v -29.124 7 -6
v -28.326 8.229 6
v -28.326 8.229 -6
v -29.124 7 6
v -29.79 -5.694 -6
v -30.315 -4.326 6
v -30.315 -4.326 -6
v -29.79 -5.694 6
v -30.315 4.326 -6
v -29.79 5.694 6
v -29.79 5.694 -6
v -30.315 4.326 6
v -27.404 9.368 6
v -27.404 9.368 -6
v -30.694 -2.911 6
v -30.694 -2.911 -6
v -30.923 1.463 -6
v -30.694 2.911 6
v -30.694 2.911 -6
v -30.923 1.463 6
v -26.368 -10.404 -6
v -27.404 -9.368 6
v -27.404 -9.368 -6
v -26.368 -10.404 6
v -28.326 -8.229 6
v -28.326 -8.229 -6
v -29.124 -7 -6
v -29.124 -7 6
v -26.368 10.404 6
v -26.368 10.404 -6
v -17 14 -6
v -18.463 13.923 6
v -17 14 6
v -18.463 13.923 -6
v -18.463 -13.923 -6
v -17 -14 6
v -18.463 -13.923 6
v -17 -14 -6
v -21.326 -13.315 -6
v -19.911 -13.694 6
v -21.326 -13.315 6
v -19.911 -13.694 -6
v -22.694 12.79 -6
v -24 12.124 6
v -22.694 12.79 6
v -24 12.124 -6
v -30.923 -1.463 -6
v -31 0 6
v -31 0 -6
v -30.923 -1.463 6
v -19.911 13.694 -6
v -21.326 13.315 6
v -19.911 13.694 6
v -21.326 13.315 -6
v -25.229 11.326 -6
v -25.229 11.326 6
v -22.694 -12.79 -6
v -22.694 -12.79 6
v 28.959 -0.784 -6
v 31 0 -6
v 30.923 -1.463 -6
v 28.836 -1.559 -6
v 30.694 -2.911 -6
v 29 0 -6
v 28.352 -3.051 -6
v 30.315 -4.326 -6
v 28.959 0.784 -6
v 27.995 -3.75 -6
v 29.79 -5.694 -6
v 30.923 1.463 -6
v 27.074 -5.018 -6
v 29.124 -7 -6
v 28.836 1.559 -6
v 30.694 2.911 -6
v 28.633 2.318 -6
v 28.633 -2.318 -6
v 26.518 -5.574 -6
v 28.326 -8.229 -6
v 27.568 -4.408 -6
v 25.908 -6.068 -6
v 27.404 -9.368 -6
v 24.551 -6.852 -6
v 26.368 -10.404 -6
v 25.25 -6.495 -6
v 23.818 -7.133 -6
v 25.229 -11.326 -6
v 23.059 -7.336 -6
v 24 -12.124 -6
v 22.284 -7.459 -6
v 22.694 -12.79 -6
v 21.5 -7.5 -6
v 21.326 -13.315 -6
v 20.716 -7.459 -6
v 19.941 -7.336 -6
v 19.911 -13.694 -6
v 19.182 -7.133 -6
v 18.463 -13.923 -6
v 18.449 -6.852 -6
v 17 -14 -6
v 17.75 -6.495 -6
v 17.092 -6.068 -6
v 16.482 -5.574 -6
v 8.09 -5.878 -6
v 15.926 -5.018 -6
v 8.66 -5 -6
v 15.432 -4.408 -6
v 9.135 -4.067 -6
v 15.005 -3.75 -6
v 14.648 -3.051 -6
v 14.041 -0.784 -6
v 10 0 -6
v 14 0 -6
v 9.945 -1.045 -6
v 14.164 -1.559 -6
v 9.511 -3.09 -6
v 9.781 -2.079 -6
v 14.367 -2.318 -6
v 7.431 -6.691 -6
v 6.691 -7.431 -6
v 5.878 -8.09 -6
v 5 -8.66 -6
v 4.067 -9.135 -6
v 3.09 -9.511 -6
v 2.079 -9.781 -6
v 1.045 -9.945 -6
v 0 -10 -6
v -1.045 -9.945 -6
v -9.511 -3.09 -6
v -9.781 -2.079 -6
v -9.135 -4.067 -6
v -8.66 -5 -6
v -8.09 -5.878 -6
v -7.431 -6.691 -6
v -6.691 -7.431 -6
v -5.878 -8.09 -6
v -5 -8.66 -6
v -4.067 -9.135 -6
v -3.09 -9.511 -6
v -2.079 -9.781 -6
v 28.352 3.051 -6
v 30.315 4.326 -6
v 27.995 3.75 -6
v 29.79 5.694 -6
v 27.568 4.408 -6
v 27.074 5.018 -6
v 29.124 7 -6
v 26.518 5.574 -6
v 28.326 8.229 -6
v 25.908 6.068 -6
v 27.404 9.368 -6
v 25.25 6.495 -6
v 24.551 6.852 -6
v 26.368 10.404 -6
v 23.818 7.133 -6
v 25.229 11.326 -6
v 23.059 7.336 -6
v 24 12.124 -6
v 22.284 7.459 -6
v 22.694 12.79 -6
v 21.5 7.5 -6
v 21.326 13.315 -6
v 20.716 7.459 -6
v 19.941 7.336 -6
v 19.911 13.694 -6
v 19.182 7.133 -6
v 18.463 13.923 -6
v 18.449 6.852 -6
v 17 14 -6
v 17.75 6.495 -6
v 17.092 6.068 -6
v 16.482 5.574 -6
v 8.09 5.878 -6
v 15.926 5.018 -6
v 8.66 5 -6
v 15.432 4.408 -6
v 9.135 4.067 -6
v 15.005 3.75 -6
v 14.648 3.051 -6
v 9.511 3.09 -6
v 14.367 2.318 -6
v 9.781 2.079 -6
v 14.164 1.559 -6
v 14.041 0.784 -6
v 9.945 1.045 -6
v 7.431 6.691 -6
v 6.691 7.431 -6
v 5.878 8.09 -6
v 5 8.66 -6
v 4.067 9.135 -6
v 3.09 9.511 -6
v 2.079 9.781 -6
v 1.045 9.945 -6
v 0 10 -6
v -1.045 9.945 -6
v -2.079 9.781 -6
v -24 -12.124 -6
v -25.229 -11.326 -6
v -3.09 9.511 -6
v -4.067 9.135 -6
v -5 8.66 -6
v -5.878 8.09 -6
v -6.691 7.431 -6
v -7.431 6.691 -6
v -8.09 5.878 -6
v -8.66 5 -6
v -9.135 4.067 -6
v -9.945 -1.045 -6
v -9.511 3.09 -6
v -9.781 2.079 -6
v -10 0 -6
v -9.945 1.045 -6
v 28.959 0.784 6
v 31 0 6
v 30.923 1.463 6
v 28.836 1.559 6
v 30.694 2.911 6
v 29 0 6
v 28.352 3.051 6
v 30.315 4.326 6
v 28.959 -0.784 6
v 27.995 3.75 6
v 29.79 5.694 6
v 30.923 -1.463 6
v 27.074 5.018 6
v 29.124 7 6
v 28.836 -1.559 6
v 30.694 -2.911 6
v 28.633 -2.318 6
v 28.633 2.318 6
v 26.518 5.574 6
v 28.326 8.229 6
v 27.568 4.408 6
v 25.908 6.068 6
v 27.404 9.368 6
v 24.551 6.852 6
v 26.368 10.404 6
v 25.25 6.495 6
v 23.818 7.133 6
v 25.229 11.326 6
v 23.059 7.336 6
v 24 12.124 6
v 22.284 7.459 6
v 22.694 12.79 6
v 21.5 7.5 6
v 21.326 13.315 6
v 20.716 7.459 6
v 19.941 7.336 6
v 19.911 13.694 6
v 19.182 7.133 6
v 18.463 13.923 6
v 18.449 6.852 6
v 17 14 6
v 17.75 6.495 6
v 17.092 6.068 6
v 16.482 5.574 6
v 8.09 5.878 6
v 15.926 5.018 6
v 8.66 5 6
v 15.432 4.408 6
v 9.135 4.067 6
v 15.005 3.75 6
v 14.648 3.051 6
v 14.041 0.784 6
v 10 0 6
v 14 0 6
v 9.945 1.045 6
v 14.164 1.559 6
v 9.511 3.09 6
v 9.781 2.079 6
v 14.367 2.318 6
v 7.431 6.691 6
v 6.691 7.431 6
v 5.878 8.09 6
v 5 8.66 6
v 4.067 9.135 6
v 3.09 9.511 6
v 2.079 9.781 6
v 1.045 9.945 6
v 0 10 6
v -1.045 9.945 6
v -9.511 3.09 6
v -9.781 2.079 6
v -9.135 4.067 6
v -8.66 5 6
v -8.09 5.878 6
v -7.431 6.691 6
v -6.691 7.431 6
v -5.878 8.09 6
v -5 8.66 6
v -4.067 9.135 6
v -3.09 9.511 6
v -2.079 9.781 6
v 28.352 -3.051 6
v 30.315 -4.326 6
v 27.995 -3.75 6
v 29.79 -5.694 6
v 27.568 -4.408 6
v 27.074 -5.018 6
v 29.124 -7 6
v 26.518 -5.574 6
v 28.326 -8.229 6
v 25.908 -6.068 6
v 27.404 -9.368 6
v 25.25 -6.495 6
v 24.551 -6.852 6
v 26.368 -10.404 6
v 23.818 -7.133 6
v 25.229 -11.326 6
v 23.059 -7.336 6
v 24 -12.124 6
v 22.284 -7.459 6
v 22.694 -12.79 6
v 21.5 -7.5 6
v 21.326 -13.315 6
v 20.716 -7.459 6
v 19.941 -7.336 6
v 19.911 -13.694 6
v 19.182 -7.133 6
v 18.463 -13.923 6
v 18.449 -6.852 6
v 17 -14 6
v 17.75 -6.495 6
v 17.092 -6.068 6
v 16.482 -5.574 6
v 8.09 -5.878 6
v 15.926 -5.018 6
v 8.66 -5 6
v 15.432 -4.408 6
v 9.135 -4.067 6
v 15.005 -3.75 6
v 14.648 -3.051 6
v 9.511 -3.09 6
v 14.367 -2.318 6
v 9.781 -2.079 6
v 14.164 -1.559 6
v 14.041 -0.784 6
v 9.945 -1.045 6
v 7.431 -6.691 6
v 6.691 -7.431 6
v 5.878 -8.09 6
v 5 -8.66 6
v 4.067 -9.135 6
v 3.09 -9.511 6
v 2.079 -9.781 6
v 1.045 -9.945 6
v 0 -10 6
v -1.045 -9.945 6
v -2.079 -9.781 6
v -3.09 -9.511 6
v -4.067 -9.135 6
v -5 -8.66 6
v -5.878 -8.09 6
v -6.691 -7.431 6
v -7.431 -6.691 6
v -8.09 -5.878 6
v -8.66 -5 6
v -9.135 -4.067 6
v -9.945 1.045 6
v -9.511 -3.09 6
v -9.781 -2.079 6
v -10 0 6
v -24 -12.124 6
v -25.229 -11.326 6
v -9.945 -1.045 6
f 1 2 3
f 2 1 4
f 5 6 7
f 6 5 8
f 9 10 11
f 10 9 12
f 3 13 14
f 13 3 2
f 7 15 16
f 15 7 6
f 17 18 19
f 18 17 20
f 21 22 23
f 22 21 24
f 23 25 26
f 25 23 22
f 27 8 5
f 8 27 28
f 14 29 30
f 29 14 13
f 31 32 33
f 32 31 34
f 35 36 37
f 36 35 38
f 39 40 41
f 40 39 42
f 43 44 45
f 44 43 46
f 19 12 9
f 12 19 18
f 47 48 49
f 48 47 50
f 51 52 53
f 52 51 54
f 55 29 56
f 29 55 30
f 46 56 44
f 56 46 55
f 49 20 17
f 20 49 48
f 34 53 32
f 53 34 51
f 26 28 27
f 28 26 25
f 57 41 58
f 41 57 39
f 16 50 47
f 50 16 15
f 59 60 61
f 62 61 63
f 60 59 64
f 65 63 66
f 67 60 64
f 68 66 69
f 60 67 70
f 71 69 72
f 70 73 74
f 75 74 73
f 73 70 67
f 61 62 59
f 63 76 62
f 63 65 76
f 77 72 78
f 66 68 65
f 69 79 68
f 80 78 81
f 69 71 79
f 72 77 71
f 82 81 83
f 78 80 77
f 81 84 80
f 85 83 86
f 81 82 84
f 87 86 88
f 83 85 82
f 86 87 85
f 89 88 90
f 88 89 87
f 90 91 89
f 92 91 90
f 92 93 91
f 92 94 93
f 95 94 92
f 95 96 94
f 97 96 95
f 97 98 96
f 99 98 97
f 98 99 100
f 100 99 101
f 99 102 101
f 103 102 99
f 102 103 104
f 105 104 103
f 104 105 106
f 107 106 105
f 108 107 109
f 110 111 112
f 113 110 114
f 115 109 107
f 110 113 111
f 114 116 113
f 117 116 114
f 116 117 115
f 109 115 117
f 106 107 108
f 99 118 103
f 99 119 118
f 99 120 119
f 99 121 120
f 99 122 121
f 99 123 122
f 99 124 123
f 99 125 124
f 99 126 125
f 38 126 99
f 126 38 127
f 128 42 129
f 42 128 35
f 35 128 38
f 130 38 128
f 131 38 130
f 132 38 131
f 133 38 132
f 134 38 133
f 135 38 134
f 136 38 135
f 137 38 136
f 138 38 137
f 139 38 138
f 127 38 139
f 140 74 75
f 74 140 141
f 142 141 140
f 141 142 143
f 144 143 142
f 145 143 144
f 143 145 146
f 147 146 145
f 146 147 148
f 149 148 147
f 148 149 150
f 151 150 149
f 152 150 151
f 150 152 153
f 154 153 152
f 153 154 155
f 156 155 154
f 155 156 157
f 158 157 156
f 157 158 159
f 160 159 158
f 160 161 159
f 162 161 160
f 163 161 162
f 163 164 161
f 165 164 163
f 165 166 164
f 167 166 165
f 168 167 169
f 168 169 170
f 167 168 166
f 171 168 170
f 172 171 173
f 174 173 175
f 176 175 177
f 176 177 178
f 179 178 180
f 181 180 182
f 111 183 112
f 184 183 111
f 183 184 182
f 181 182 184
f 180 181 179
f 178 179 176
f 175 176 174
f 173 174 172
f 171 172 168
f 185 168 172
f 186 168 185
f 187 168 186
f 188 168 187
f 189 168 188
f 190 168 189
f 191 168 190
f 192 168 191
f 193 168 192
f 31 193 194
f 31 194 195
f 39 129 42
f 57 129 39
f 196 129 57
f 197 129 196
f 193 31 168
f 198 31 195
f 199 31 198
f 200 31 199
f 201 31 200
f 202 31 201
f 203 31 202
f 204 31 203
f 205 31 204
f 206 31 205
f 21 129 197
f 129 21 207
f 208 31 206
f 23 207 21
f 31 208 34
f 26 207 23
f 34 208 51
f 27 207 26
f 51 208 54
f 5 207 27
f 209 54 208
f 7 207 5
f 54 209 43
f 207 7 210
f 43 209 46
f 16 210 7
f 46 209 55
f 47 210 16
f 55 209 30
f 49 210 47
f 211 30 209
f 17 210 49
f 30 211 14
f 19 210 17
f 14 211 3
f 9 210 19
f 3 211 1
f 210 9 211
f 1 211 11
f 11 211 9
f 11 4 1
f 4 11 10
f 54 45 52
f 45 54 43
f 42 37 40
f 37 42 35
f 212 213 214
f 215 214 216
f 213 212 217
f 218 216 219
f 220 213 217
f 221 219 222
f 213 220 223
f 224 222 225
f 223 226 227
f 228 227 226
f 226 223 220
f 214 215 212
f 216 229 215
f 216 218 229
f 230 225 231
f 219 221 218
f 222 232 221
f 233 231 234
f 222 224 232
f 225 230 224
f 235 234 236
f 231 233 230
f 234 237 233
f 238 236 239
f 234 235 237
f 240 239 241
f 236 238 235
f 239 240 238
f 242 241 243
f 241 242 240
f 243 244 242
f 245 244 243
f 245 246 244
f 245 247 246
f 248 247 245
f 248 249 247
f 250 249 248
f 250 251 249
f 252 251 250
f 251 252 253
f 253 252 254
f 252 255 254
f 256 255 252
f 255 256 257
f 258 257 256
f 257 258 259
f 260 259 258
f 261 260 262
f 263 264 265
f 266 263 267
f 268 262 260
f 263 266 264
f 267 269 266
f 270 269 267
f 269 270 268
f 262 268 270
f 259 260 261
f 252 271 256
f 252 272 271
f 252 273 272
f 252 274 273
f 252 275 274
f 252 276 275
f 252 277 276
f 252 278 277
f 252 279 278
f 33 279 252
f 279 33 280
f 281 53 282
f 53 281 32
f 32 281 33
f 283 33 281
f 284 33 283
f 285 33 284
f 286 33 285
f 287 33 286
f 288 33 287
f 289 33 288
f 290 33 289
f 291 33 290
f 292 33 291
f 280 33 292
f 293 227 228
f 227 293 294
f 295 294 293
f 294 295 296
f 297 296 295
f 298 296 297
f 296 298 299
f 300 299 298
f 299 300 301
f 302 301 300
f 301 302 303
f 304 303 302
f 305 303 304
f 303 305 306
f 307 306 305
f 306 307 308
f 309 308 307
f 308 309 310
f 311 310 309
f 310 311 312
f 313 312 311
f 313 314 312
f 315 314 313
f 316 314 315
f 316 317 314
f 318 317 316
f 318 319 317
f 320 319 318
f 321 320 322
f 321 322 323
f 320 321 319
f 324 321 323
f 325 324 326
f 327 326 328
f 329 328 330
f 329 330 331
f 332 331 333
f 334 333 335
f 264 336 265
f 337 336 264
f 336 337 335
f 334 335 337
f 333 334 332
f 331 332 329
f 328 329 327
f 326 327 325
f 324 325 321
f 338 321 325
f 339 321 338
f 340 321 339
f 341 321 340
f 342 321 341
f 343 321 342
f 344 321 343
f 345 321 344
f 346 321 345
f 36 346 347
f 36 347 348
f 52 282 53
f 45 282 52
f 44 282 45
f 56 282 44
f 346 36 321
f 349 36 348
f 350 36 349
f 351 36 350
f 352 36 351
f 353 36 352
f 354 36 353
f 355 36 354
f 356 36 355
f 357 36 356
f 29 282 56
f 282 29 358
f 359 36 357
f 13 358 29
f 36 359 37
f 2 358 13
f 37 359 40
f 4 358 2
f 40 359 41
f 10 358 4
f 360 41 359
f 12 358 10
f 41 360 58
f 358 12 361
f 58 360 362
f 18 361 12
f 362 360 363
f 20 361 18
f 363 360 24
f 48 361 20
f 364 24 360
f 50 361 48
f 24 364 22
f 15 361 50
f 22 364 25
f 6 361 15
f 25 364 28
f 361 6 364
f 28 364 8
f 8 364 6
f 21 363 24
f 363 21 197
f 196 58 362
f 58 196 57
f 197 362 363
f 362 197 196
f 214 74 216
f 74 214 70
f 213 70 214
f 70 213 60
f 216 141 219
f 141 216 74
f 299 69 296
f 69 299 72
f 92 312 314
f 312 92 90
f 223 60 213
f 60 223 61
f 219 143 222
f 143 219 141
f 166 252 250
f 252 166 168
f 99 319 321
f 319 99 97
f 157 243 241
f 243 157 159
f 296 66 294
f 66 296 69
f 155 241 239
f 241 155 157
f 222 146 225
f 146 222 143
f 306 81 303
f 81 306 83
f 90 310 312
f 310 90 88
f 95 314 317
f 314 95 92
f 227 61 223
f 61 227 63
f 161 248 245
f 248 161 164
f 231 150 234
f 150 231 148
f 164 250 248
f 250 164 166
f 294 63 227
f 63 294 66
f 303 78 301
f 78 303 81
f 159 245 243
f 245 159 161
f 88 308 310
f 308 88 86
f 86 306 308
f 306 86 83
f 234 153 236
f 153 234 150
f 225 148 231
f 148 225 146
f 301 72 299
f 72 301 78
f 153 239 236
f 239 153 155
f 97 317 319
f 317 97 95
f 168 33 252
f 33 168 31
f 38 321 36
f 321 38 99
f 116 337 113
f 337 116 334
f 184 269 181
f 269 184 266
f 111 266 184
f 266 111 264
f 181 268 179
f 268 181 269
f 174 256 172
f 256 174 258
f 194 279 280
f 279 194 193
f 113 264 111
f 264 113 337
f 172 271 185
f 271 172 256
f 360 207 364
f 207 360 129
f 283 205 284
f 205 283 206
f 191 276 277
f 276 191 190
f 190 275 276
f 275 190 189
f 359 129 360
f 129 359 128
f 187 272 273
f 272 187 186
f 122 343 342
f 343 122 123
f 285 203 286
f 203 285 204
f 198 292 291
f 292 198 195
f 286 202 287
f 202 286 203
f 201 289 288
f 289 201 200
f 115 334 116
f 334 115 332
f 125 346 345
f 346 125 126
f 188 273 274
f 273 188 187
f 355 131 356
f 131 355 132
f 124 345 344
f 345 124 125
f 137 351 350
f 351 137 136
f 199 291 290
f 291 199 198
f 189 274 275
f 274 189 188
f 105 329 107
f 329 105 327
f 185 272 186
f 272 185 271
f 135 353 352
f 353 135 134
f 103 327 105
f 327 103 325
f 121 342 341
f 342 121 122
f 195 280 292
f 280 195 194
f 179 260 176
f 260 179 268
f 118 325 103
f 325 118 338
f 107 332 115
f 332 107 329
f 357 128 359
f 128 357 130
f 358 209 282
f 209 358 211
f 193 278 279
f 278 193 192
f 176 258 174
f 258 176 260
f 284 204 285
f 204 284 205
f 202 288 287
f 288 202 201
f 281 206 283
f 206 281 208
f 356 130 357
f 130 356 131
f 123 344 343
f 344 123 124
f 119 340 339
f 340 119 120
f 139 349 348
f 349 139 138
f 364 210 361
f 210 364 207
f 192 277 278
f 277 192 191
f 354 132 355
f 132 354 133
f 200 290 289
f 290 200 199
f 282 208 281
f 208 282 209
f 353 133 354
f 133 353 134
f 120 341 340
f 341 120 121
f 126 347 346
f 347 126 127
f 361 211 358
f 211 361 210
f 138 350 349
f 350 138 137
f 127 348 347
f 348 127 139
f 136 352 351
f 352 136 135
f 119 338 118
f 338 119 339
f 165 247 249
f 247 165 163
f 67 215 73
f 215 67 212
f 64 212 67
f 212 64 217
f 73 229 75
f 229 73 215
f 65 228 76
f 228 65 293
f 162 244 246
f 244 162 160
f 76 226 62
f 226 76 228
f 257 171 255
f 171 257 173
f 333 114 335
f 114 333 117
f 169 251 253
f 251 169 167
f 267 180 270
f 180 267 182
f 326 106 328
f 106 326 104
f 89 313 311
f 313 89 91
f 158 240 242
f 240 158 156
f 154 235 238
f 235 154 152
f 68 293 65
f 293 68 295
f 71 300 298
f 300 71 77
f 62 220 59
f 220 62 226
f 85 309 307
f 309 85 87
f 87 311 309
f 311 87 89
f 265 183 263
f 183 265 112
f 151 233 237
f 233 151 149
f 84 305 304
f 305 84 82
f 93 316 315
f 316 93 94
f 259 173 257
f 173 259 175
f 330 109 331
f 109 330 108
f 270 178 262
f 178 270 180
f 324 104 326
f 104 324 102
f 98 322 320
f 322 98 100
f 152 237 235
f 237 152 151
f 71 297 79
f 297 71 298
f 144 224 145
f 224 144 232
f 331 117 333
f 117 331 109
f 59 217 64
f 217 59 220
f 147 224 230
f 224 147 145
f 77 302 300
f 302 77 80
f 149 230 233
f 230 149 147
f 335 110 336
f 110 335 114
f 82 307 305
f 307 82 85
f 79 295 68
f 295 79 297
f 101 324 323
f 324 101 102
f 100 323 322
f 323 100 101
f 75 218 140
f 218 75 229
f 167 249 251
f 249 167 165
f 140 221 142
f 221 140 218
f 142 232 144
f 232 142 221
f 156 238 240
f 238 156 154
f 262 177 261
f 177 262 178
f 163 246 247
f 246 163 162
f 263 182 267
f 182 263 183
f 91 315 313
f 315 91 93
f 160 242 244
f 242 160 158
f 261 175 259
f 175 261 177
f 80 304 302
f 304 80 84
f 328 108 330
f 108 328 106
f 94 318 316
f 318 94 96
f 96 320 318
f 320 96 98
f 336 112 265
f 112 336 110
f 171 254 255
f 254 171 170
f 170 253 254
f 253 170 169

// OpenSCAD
dremel_accessory_diam = 20;
dremel_accesory_height = 12;

aspirator_thickness_thick = 4;
aspirator_thickness_slim = 2;

aspirator_tube_diam = 15;
aspirator_tube_holder_height = 15;

aspirator_hole_height = 15;
aspirator_hole_diam = 15;

dremel_wrench_diam = 25;

// Useful MCAD functions reference

//use <MCAD/motors.scad>
//stepper_motor_mount(nema_standard=17, slide_distance=10, $fn=40, mochup=true);

//use <MCAD/boxes.scad>
//roundedBox([10,20,30], radius=2, sidesonly=false, $fn=60);

//include <MCAD/stepper.scad>
//motor(Nema17, size=NemaMedium, dualAxis=false);


//use <MCAD/teardrop.scad>
//teardrop(radius=10, length=20, angle=90);

//use <MCAD/nuts_and_bolts.scad>
//nutHole(size=3, tolerance=0.5, proj=-1);
//boltHole(size=3, length=10, tolerance=0.5, proj=-1, $fn=40);


use <MCAD/boxes.scad>


difference() {
	roundedBox([dremel_accessory_diam+aspirator_tube_diam*2+aspirator_thickness_thick*3,
		dremel_accessory_diam+aspirator_thickness_thick*2,
		dremel_accesory_height],
		radius=(dremel_accessory_diam+aspirator_thickness_thick*2)/2,
		sidesonly=true, $fn=60);
	
	cylinder(r=dremel_accessory_diam/2, h=dremel_accesory_height+0.1, $fn=60,center=true);
	translate([dremel_accessory_diam/2+aspirator_tube_diam/2+aspirator_thickness_thick,0,0])
		cylinder(r=aspirator_tube_diam/2, h=dremel_accesory_height+0.1, $fn=60,center=true);
}
